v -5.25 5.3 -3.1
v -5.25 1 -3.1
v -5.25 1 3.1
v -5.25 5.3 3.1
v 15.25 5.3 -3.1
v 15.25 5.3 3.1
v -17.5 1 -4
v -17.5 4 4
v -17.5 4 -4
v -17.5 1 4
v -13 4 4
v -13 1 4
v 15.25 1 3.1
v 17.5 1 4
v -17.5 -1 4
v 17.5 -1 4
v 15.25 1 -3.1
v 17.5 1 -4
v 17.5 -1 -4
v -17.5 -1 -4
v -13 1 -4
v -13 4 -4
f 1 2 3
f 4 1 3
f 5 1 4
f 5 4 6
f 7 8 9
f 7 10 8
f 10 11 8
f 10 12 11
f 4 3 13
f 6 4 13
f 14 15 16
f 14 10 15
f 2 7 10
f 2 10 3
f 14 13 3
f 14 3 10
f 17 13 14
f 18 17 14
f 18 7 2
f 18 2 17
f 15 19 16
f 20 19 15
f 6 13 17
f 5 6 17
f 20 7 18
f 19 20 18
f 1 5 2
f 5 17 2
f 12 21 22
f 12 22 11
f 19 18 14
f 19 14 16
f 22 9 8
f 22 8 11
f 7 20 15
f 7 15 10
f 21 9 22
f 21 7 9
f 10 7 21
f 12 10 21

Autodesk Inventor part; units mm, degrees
ref_plane "YZ Plane" through (0, 0, 0) normal (1, 0, 0) x (0, 1, 0)
ref_plane "XZ Plane" through (0, 0, 0) normal (0, 1, 0) x (-1, 0, 0)
ref_plane "XY Plane" through (0, 0, 0) normal (0, 0, 1) x (1, 0, 0)
sketch "Sketch4" plane through (0, 0, 0) normal (0, 0, 1) x (1, 0, 0)
  line L0 (-17.5, 1) -> (17.5, 1)
  line L1 (17.5, 1) -> (17.5, -1)
  line L2 (17.5, -1) -> (-17.5, -1)
  line L3 (-17.5, -1) -> (-17.5, 1)
  line L4 (-17.5, 1) -> (17.5, -1) construction
  line L5 (17.5, 1) -> (-17.5, -1) construction
  point P0 (0, 0)
  dimension "d4" = 35
  dimension "d5" = 2
extrude "Extrusion2" add sketch "Sketch4" along normal mid plane 8
sketch "Sketch5" plane through (-17.5, 1, 4) normal (0, 1, 0) x (1, 0, 0)
  line L0 (35, 8) -> (35, 0) projected
  line L1 (35, 4) -> (32.75, 4)
  line L2 (32.75, 4) -> (12.25, 4)
  line L3 (12.25, 0.9) -> (32.75, 0.9)
  line L4 (32.75, 0.9) -> (32.75, 7.1)
  line L5 (32.75, 7.1) -> (12.25, 7.1)
  line L6 (12.25, 7.1) -> (12.25, 0.9)
  line L7 (12.25, 0.9) -> (32.75, 7.1) construction
  line L8 (32.75, 0.9) -> (12.25, 7.1) construction
  point P0 (17.5, 4)
  point P1 (22.5, 4)
  dimension "d8" = 2.25
  dimension "d9" = 20.5
  dimension "d10" = 20.5
  dimension "d11" = 6.2
extrude "Extrusion3" add sketch "Sketch5" along normal blind 4.3
sketch "Sketch6" plane through (-17.5, 1, 4) normal (0, 1, 0) x (1, 0, 0)
  line L0 (0, 8) -> (35, 8) projected
  line L1 (0, 8) -> (4.5, 8)
  line L2 (4.5, 8) -> (4.5, 0)
  line L3 (4.5, 0) -> (0, 0)
  line L4 (0, 0) -> (0, 8)
  point P0 (17.5, 4)
  dimension "d14" = 4.5
extrude "Extrusion4" add sketch "Sketch6" along normal blind 3 separate body
properties part number "GPS"
